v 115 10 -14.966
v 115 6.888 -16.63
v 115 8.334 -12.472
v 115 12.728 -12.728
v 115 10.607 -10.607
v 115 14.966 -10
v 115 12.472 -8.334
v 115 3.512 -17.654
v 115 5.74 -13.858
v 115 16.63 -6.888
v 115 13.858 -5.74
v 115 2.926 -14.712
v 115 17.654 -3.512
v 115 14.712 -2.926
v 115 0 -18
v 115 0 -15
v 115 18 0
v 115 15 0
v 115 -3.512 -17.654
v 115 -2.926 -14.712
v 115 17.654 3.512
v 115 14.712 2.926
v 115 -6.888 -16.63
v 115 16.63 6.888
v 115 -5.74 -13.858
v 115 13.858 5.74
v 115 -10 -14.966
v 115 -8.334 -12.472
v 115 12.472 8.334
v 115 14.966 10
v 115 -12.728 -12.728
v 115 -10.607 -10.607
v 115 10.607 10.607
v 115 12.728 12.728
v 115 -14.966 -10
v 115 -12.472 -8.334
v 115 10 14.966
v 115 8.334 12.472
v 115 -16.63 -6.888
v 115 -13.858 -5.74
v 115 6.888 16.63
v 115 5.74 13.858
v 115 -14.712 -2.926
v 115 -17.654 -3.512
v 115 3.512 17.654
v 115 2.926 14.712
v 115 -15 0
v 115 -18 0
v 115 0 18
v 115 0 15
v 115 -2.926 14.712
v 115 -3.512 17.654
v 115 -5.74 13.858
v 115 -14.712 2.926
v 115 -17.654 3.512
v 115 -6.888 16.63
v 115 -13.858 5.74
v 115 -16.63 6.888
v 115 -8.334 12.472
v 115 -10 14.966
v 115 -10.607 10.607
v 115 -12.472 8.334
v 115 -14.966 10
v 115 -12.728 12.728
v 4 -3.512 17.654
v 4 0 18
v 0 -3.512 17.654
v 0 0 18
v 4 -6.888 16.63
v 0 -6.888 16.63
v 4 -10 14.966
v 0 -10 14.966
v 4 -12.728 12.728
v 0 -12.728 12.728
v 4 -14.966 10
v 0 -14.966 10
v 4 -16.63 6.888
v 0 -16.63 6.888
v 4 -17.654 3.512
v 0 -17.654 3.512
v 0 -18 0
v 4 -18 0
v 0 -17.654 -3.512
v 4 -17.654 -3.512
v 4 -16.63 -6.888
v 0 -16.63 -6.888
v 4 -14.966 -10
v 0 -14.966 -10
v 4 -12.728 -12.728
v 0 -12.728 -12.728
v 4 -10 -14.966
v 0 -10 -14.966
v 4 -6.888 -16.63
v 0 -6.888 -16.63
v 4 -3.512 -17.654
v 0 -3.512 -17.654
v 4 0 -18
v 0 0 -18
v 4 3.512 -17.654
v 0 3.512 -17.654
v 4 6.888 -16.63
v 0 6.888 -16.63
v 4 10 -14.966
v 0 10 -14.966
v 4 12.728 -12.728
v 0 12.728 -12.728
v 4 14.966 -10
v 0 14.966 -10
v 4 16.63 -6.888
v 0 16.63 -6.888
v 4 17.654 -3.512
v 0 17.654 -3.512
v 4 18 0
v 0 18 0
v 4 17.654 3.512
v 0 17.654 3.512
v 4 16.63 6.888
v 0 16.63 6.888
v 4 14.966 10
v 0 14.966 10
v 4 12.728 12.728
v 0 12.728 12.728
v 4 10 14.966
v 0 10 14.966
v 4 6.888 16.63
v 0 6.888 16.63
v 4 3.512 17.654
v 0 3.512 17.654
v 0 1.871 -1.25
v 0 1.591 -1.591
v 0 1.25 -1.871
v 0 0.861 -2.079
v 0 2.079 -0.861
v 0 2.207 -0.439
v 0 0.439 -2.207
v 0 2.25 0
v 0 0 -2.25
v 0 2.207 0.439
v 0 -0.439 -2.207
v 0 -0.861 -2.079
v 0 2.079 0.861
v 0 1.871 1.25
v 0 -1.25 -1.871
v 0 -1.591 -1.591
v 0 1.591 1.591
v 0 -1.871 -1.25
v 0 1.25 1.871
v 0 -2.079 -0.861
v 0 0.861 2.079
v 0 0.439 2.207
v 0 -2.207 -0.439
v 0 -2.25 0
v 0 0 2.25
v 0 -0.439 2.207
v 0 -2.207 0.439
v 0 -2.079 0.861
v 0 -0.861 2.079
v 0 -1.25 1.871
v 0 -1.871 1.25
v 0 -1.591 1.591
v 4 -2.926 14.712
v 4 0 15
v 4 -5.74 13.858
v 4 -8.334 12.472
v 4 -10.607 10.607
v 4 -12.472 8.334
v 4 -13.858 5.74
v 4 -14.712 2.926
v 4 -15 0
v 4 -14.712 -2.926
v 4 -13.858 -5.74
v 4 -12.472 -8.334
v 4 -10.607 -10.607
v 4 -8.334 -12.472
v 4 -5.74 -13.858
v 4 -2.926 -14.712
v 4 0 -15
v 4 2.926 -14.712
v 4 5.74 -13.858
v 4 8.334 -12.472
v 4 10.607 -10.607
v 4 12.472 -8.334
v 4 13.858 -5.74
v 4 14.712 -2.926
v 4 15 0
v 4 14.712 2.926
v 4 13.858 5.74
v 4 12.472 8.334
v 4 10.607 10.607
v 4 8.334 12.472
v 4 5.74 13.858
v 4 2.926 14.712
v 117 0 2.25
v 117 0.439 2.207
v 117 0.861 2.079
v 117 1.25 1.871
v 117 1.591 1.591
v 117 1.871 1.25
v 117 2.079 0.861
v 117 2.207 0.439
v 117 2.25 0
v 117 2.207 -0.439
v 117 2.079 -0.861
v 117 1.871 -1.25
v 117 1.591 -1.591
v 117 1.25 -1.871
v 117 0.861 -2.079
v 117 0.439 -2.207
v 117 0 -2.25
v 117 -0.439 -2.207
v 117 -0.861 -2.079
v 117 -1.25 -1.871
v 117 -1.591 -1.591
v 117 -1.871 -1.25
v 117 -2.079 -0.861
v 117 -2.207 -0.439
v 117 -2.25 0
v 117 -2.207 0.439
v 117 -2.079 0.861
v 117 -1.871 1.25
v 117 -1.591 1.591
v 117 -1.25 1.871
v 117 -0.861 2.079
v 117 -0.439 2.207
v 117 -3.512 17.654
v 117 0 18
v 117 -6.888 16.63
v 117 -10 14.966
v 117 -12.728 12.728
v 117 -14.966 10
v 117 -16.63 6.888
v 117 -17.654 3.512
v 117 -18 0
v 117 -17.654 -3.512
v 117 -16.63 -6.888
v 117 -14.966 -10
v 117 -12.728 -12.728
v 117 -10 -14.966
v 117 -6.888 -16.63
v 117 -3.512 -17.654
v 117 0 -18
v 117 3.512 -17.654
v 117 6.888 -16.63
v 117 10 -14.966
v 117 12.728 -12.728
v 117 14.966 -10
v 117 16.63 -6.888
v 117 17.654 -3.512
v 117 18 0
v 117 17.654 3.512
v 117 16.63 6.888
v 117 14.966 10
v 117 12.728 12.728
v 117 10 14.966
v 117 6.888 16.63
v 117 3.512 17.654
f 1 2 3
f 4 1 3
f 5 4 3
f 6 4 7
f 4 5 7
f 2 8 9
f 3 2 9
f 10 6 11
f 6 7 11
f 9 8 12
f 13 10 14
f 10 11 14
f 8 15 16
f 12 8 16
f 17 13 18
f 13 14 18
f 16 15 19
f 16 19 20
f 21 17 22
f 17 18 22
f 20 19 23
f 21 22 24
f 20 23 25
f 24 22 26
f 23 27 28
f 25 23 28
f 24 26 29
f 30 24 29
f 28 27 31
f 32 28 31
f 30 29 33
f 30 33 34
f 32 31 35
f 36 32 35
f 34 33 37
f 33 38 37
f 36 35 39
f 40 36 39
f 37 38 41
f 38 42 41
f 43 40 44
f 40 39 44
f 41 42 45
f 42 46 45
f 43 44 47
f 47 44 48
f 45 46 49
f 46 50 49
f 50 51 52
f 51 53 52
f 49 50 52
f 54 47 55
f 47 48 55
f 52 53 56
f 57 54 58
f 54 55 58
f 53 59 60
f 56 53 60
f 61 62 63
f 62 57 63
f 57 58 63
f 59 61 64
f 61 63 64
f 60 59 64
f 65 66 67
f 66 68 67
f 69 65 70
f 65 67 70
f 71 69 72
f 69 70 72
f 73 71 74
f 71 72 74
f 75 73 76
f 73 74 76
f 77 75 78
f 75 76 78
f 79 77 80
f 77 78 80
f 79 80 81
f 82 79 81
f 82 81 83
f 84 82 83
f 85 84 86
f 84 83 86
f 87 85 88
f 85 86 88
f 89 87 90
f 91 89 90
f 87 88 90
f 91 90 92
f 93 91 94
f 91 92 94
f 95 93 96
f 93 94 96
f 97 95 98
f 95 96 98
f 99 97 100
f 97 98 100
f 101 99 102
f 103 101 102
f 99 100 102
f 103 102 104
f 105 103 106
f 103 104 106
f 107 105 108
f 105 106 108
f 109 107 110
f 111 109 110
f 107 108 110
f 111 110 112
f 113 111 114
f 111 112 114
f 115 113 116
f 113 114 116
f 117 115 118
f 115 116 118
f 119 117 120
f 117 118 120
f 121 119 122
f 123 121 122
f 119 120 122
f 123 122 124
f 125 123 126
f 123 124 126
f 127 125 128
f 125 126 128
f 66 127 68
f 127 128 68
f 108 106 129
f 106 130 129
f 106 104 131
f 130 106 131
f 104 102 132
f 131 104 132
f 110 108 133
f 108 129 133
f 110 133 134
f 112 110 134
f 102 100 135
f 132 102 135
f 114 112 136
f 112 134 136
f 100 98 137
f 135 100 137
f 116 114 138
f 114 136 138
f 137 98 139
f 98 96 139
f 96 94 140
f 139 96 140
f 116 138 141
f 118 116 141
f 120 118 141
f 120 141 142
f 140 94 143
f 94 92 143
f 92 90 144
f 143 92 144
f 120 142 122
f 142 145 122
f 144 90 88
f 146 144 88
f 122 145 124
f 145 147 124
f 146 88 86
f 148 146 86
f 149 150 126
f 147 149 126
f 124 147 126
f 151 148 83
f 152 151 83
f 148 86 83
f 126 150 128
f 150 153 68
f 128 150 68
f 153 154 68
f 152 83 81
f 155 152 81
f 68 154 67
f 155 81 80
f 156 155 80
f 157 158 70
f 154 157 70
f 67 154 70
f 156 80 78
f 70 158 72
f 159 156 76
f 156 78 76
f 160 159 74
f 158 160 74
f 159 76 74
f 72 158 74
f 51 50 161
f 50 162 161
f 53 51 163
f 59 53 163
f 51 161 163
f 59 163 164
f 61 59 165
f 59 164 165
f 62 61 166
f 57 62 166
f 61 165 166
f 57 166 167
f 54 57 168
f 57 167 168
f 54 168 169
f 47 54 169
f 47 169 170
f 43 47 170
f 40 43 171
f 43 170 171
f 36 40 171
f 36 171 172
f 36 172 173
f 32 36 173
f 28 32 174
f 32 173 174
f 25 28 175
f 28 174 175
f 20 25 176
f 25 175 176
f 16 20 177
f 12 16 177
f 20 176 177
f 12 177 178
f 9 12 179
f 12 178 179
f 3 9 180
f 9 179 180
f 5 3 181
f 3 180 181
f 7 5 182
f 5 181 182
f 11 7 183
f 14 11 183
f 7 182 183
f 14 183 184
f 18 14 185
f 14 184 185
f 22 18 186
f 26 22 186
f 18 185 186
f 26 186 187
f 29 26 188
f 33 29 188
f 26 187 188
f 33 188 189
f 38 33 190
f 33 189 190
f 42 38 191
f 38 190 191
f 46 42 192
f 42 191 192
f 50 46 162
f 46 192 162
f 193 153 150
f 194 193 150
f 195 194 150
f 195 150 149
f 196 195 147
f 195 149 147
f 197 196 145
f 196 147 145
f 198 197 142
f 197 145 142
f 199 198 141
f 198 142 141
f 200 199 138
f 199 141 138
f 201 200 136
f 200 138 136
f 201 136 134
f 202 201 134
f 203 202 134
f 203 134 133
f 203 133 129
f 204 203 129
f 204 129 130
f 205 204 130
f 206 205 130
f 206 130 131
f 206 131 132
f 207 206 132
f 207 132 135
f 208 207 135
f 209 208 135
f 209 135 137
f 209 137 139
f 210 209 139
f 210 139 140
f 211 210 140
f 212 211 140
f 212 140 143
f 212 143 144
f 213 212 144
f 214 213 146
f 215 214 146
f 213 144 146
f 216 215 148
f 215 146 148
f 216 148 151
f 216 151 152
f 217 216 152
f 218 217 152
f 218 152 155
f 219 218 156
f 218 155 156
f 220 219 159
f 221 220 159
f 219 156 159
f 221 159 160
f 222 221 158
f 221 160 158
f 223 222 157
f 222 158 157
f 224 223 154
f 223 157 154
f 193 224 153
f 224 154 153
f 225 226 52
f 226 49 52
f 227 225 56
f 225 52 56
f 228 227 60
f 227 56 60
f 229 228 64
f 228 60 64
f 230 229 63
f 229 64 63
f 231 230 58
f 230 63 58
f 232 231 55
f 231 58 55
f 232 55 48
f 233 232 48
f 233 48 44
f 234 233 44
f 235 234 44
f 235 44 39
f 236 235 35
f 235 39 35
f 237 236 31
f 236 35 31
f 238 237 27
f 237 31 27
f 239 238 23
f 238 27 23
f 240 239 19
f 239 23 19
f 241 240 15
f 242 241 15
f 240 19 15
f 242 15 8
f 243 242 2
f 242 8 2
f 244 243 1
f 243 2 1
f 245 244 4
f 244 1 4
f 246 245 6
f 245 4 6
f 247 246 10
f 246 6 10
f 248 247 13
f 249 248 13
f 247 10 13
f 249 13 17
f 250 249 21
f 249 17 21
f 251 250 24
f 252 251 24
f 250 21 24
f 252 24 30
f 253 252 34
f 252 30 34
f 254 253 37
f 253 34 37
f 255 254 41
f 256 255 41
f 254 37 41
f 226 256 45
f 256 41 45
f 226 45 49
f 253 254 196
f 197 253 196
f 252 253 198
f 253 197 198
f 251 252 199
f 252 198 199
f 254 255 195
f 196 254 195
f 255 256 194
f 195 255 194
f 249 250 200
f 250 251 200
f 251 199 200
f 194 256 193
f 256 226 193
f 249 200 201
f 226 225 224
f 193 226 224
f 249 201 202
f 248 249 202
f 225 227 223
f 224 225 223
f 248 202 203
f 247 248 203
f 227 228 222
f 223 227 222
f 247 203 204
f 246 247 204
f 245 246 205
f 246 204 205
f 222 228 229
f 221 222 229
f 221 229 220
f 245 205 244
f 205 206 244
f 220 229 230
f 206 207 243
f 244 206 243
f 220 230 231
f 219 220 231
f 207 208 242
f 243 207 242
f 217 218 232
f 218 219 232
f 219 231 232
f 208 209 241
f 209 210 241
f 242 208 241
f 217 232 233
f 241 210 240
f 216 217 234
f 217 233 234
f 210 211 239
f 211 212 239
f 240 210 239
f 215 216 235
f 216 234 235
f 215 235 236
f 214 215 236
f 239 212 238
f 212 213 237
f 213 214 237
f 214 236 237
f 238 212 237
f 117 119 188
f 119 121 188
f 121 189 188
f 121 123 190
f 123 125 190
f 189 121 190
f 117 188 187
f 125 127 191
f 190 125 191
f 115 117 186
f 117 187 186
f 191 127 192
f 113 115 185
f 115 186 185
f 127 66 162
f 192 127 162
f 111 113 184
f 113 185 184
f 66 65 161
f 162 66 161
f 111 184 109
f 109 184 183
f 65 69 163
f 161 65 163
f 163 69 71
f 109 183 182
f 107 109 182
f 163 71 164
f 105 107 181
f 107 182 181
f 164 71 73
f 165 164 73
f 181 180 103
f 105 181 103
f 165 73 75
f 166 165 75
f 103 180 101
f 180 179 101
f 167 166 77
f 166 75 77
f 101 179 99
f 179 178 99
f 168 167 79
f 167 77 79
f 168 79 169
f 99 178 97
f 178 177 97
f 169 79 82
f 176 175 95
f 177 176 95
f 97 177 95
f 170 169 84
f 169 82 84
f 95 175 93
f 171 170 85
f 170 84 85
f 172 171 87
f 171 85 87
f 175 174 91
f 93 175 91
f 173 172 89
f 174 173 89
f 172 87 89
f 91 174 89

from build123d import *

# Parameters (mm, degrees)
ESQUISSE4_R             = 2.25
ENL_V_MAT_EXTRU_2_DEPTH = 120.737212261


with BuildPart() as part:
    # Esquisse2 → Révolution1 (revolve)
    with BuildSketch(Plane.XY, mode=Mode.PRIVATE) as r_volution1_sk:
        Polygon((4, 18), (0, 18), (0, 0), (117, 0), (117, 18), (115, 18), (115, 15), (4, 15), align=None)
    revolve(r_volution1_sk.sketch.rotate(Axis((-23.43828007, 0, 0), (1, 0, 0)), 90), axis=Axis((-23.43828007, 0, 0), (1, 0, 0)))

    # Esquisse4 → Enlèv. mat.-Extru.2 (cut, through all)
    with BuildSketch(Plane.ZY):
        Circle(ESQUISSE4_R)
    extrude(amount=-ENL_V_MAT_EXTRU_2_DEPTH, mode=Mode.SUBTRACT)


solid = part.part
